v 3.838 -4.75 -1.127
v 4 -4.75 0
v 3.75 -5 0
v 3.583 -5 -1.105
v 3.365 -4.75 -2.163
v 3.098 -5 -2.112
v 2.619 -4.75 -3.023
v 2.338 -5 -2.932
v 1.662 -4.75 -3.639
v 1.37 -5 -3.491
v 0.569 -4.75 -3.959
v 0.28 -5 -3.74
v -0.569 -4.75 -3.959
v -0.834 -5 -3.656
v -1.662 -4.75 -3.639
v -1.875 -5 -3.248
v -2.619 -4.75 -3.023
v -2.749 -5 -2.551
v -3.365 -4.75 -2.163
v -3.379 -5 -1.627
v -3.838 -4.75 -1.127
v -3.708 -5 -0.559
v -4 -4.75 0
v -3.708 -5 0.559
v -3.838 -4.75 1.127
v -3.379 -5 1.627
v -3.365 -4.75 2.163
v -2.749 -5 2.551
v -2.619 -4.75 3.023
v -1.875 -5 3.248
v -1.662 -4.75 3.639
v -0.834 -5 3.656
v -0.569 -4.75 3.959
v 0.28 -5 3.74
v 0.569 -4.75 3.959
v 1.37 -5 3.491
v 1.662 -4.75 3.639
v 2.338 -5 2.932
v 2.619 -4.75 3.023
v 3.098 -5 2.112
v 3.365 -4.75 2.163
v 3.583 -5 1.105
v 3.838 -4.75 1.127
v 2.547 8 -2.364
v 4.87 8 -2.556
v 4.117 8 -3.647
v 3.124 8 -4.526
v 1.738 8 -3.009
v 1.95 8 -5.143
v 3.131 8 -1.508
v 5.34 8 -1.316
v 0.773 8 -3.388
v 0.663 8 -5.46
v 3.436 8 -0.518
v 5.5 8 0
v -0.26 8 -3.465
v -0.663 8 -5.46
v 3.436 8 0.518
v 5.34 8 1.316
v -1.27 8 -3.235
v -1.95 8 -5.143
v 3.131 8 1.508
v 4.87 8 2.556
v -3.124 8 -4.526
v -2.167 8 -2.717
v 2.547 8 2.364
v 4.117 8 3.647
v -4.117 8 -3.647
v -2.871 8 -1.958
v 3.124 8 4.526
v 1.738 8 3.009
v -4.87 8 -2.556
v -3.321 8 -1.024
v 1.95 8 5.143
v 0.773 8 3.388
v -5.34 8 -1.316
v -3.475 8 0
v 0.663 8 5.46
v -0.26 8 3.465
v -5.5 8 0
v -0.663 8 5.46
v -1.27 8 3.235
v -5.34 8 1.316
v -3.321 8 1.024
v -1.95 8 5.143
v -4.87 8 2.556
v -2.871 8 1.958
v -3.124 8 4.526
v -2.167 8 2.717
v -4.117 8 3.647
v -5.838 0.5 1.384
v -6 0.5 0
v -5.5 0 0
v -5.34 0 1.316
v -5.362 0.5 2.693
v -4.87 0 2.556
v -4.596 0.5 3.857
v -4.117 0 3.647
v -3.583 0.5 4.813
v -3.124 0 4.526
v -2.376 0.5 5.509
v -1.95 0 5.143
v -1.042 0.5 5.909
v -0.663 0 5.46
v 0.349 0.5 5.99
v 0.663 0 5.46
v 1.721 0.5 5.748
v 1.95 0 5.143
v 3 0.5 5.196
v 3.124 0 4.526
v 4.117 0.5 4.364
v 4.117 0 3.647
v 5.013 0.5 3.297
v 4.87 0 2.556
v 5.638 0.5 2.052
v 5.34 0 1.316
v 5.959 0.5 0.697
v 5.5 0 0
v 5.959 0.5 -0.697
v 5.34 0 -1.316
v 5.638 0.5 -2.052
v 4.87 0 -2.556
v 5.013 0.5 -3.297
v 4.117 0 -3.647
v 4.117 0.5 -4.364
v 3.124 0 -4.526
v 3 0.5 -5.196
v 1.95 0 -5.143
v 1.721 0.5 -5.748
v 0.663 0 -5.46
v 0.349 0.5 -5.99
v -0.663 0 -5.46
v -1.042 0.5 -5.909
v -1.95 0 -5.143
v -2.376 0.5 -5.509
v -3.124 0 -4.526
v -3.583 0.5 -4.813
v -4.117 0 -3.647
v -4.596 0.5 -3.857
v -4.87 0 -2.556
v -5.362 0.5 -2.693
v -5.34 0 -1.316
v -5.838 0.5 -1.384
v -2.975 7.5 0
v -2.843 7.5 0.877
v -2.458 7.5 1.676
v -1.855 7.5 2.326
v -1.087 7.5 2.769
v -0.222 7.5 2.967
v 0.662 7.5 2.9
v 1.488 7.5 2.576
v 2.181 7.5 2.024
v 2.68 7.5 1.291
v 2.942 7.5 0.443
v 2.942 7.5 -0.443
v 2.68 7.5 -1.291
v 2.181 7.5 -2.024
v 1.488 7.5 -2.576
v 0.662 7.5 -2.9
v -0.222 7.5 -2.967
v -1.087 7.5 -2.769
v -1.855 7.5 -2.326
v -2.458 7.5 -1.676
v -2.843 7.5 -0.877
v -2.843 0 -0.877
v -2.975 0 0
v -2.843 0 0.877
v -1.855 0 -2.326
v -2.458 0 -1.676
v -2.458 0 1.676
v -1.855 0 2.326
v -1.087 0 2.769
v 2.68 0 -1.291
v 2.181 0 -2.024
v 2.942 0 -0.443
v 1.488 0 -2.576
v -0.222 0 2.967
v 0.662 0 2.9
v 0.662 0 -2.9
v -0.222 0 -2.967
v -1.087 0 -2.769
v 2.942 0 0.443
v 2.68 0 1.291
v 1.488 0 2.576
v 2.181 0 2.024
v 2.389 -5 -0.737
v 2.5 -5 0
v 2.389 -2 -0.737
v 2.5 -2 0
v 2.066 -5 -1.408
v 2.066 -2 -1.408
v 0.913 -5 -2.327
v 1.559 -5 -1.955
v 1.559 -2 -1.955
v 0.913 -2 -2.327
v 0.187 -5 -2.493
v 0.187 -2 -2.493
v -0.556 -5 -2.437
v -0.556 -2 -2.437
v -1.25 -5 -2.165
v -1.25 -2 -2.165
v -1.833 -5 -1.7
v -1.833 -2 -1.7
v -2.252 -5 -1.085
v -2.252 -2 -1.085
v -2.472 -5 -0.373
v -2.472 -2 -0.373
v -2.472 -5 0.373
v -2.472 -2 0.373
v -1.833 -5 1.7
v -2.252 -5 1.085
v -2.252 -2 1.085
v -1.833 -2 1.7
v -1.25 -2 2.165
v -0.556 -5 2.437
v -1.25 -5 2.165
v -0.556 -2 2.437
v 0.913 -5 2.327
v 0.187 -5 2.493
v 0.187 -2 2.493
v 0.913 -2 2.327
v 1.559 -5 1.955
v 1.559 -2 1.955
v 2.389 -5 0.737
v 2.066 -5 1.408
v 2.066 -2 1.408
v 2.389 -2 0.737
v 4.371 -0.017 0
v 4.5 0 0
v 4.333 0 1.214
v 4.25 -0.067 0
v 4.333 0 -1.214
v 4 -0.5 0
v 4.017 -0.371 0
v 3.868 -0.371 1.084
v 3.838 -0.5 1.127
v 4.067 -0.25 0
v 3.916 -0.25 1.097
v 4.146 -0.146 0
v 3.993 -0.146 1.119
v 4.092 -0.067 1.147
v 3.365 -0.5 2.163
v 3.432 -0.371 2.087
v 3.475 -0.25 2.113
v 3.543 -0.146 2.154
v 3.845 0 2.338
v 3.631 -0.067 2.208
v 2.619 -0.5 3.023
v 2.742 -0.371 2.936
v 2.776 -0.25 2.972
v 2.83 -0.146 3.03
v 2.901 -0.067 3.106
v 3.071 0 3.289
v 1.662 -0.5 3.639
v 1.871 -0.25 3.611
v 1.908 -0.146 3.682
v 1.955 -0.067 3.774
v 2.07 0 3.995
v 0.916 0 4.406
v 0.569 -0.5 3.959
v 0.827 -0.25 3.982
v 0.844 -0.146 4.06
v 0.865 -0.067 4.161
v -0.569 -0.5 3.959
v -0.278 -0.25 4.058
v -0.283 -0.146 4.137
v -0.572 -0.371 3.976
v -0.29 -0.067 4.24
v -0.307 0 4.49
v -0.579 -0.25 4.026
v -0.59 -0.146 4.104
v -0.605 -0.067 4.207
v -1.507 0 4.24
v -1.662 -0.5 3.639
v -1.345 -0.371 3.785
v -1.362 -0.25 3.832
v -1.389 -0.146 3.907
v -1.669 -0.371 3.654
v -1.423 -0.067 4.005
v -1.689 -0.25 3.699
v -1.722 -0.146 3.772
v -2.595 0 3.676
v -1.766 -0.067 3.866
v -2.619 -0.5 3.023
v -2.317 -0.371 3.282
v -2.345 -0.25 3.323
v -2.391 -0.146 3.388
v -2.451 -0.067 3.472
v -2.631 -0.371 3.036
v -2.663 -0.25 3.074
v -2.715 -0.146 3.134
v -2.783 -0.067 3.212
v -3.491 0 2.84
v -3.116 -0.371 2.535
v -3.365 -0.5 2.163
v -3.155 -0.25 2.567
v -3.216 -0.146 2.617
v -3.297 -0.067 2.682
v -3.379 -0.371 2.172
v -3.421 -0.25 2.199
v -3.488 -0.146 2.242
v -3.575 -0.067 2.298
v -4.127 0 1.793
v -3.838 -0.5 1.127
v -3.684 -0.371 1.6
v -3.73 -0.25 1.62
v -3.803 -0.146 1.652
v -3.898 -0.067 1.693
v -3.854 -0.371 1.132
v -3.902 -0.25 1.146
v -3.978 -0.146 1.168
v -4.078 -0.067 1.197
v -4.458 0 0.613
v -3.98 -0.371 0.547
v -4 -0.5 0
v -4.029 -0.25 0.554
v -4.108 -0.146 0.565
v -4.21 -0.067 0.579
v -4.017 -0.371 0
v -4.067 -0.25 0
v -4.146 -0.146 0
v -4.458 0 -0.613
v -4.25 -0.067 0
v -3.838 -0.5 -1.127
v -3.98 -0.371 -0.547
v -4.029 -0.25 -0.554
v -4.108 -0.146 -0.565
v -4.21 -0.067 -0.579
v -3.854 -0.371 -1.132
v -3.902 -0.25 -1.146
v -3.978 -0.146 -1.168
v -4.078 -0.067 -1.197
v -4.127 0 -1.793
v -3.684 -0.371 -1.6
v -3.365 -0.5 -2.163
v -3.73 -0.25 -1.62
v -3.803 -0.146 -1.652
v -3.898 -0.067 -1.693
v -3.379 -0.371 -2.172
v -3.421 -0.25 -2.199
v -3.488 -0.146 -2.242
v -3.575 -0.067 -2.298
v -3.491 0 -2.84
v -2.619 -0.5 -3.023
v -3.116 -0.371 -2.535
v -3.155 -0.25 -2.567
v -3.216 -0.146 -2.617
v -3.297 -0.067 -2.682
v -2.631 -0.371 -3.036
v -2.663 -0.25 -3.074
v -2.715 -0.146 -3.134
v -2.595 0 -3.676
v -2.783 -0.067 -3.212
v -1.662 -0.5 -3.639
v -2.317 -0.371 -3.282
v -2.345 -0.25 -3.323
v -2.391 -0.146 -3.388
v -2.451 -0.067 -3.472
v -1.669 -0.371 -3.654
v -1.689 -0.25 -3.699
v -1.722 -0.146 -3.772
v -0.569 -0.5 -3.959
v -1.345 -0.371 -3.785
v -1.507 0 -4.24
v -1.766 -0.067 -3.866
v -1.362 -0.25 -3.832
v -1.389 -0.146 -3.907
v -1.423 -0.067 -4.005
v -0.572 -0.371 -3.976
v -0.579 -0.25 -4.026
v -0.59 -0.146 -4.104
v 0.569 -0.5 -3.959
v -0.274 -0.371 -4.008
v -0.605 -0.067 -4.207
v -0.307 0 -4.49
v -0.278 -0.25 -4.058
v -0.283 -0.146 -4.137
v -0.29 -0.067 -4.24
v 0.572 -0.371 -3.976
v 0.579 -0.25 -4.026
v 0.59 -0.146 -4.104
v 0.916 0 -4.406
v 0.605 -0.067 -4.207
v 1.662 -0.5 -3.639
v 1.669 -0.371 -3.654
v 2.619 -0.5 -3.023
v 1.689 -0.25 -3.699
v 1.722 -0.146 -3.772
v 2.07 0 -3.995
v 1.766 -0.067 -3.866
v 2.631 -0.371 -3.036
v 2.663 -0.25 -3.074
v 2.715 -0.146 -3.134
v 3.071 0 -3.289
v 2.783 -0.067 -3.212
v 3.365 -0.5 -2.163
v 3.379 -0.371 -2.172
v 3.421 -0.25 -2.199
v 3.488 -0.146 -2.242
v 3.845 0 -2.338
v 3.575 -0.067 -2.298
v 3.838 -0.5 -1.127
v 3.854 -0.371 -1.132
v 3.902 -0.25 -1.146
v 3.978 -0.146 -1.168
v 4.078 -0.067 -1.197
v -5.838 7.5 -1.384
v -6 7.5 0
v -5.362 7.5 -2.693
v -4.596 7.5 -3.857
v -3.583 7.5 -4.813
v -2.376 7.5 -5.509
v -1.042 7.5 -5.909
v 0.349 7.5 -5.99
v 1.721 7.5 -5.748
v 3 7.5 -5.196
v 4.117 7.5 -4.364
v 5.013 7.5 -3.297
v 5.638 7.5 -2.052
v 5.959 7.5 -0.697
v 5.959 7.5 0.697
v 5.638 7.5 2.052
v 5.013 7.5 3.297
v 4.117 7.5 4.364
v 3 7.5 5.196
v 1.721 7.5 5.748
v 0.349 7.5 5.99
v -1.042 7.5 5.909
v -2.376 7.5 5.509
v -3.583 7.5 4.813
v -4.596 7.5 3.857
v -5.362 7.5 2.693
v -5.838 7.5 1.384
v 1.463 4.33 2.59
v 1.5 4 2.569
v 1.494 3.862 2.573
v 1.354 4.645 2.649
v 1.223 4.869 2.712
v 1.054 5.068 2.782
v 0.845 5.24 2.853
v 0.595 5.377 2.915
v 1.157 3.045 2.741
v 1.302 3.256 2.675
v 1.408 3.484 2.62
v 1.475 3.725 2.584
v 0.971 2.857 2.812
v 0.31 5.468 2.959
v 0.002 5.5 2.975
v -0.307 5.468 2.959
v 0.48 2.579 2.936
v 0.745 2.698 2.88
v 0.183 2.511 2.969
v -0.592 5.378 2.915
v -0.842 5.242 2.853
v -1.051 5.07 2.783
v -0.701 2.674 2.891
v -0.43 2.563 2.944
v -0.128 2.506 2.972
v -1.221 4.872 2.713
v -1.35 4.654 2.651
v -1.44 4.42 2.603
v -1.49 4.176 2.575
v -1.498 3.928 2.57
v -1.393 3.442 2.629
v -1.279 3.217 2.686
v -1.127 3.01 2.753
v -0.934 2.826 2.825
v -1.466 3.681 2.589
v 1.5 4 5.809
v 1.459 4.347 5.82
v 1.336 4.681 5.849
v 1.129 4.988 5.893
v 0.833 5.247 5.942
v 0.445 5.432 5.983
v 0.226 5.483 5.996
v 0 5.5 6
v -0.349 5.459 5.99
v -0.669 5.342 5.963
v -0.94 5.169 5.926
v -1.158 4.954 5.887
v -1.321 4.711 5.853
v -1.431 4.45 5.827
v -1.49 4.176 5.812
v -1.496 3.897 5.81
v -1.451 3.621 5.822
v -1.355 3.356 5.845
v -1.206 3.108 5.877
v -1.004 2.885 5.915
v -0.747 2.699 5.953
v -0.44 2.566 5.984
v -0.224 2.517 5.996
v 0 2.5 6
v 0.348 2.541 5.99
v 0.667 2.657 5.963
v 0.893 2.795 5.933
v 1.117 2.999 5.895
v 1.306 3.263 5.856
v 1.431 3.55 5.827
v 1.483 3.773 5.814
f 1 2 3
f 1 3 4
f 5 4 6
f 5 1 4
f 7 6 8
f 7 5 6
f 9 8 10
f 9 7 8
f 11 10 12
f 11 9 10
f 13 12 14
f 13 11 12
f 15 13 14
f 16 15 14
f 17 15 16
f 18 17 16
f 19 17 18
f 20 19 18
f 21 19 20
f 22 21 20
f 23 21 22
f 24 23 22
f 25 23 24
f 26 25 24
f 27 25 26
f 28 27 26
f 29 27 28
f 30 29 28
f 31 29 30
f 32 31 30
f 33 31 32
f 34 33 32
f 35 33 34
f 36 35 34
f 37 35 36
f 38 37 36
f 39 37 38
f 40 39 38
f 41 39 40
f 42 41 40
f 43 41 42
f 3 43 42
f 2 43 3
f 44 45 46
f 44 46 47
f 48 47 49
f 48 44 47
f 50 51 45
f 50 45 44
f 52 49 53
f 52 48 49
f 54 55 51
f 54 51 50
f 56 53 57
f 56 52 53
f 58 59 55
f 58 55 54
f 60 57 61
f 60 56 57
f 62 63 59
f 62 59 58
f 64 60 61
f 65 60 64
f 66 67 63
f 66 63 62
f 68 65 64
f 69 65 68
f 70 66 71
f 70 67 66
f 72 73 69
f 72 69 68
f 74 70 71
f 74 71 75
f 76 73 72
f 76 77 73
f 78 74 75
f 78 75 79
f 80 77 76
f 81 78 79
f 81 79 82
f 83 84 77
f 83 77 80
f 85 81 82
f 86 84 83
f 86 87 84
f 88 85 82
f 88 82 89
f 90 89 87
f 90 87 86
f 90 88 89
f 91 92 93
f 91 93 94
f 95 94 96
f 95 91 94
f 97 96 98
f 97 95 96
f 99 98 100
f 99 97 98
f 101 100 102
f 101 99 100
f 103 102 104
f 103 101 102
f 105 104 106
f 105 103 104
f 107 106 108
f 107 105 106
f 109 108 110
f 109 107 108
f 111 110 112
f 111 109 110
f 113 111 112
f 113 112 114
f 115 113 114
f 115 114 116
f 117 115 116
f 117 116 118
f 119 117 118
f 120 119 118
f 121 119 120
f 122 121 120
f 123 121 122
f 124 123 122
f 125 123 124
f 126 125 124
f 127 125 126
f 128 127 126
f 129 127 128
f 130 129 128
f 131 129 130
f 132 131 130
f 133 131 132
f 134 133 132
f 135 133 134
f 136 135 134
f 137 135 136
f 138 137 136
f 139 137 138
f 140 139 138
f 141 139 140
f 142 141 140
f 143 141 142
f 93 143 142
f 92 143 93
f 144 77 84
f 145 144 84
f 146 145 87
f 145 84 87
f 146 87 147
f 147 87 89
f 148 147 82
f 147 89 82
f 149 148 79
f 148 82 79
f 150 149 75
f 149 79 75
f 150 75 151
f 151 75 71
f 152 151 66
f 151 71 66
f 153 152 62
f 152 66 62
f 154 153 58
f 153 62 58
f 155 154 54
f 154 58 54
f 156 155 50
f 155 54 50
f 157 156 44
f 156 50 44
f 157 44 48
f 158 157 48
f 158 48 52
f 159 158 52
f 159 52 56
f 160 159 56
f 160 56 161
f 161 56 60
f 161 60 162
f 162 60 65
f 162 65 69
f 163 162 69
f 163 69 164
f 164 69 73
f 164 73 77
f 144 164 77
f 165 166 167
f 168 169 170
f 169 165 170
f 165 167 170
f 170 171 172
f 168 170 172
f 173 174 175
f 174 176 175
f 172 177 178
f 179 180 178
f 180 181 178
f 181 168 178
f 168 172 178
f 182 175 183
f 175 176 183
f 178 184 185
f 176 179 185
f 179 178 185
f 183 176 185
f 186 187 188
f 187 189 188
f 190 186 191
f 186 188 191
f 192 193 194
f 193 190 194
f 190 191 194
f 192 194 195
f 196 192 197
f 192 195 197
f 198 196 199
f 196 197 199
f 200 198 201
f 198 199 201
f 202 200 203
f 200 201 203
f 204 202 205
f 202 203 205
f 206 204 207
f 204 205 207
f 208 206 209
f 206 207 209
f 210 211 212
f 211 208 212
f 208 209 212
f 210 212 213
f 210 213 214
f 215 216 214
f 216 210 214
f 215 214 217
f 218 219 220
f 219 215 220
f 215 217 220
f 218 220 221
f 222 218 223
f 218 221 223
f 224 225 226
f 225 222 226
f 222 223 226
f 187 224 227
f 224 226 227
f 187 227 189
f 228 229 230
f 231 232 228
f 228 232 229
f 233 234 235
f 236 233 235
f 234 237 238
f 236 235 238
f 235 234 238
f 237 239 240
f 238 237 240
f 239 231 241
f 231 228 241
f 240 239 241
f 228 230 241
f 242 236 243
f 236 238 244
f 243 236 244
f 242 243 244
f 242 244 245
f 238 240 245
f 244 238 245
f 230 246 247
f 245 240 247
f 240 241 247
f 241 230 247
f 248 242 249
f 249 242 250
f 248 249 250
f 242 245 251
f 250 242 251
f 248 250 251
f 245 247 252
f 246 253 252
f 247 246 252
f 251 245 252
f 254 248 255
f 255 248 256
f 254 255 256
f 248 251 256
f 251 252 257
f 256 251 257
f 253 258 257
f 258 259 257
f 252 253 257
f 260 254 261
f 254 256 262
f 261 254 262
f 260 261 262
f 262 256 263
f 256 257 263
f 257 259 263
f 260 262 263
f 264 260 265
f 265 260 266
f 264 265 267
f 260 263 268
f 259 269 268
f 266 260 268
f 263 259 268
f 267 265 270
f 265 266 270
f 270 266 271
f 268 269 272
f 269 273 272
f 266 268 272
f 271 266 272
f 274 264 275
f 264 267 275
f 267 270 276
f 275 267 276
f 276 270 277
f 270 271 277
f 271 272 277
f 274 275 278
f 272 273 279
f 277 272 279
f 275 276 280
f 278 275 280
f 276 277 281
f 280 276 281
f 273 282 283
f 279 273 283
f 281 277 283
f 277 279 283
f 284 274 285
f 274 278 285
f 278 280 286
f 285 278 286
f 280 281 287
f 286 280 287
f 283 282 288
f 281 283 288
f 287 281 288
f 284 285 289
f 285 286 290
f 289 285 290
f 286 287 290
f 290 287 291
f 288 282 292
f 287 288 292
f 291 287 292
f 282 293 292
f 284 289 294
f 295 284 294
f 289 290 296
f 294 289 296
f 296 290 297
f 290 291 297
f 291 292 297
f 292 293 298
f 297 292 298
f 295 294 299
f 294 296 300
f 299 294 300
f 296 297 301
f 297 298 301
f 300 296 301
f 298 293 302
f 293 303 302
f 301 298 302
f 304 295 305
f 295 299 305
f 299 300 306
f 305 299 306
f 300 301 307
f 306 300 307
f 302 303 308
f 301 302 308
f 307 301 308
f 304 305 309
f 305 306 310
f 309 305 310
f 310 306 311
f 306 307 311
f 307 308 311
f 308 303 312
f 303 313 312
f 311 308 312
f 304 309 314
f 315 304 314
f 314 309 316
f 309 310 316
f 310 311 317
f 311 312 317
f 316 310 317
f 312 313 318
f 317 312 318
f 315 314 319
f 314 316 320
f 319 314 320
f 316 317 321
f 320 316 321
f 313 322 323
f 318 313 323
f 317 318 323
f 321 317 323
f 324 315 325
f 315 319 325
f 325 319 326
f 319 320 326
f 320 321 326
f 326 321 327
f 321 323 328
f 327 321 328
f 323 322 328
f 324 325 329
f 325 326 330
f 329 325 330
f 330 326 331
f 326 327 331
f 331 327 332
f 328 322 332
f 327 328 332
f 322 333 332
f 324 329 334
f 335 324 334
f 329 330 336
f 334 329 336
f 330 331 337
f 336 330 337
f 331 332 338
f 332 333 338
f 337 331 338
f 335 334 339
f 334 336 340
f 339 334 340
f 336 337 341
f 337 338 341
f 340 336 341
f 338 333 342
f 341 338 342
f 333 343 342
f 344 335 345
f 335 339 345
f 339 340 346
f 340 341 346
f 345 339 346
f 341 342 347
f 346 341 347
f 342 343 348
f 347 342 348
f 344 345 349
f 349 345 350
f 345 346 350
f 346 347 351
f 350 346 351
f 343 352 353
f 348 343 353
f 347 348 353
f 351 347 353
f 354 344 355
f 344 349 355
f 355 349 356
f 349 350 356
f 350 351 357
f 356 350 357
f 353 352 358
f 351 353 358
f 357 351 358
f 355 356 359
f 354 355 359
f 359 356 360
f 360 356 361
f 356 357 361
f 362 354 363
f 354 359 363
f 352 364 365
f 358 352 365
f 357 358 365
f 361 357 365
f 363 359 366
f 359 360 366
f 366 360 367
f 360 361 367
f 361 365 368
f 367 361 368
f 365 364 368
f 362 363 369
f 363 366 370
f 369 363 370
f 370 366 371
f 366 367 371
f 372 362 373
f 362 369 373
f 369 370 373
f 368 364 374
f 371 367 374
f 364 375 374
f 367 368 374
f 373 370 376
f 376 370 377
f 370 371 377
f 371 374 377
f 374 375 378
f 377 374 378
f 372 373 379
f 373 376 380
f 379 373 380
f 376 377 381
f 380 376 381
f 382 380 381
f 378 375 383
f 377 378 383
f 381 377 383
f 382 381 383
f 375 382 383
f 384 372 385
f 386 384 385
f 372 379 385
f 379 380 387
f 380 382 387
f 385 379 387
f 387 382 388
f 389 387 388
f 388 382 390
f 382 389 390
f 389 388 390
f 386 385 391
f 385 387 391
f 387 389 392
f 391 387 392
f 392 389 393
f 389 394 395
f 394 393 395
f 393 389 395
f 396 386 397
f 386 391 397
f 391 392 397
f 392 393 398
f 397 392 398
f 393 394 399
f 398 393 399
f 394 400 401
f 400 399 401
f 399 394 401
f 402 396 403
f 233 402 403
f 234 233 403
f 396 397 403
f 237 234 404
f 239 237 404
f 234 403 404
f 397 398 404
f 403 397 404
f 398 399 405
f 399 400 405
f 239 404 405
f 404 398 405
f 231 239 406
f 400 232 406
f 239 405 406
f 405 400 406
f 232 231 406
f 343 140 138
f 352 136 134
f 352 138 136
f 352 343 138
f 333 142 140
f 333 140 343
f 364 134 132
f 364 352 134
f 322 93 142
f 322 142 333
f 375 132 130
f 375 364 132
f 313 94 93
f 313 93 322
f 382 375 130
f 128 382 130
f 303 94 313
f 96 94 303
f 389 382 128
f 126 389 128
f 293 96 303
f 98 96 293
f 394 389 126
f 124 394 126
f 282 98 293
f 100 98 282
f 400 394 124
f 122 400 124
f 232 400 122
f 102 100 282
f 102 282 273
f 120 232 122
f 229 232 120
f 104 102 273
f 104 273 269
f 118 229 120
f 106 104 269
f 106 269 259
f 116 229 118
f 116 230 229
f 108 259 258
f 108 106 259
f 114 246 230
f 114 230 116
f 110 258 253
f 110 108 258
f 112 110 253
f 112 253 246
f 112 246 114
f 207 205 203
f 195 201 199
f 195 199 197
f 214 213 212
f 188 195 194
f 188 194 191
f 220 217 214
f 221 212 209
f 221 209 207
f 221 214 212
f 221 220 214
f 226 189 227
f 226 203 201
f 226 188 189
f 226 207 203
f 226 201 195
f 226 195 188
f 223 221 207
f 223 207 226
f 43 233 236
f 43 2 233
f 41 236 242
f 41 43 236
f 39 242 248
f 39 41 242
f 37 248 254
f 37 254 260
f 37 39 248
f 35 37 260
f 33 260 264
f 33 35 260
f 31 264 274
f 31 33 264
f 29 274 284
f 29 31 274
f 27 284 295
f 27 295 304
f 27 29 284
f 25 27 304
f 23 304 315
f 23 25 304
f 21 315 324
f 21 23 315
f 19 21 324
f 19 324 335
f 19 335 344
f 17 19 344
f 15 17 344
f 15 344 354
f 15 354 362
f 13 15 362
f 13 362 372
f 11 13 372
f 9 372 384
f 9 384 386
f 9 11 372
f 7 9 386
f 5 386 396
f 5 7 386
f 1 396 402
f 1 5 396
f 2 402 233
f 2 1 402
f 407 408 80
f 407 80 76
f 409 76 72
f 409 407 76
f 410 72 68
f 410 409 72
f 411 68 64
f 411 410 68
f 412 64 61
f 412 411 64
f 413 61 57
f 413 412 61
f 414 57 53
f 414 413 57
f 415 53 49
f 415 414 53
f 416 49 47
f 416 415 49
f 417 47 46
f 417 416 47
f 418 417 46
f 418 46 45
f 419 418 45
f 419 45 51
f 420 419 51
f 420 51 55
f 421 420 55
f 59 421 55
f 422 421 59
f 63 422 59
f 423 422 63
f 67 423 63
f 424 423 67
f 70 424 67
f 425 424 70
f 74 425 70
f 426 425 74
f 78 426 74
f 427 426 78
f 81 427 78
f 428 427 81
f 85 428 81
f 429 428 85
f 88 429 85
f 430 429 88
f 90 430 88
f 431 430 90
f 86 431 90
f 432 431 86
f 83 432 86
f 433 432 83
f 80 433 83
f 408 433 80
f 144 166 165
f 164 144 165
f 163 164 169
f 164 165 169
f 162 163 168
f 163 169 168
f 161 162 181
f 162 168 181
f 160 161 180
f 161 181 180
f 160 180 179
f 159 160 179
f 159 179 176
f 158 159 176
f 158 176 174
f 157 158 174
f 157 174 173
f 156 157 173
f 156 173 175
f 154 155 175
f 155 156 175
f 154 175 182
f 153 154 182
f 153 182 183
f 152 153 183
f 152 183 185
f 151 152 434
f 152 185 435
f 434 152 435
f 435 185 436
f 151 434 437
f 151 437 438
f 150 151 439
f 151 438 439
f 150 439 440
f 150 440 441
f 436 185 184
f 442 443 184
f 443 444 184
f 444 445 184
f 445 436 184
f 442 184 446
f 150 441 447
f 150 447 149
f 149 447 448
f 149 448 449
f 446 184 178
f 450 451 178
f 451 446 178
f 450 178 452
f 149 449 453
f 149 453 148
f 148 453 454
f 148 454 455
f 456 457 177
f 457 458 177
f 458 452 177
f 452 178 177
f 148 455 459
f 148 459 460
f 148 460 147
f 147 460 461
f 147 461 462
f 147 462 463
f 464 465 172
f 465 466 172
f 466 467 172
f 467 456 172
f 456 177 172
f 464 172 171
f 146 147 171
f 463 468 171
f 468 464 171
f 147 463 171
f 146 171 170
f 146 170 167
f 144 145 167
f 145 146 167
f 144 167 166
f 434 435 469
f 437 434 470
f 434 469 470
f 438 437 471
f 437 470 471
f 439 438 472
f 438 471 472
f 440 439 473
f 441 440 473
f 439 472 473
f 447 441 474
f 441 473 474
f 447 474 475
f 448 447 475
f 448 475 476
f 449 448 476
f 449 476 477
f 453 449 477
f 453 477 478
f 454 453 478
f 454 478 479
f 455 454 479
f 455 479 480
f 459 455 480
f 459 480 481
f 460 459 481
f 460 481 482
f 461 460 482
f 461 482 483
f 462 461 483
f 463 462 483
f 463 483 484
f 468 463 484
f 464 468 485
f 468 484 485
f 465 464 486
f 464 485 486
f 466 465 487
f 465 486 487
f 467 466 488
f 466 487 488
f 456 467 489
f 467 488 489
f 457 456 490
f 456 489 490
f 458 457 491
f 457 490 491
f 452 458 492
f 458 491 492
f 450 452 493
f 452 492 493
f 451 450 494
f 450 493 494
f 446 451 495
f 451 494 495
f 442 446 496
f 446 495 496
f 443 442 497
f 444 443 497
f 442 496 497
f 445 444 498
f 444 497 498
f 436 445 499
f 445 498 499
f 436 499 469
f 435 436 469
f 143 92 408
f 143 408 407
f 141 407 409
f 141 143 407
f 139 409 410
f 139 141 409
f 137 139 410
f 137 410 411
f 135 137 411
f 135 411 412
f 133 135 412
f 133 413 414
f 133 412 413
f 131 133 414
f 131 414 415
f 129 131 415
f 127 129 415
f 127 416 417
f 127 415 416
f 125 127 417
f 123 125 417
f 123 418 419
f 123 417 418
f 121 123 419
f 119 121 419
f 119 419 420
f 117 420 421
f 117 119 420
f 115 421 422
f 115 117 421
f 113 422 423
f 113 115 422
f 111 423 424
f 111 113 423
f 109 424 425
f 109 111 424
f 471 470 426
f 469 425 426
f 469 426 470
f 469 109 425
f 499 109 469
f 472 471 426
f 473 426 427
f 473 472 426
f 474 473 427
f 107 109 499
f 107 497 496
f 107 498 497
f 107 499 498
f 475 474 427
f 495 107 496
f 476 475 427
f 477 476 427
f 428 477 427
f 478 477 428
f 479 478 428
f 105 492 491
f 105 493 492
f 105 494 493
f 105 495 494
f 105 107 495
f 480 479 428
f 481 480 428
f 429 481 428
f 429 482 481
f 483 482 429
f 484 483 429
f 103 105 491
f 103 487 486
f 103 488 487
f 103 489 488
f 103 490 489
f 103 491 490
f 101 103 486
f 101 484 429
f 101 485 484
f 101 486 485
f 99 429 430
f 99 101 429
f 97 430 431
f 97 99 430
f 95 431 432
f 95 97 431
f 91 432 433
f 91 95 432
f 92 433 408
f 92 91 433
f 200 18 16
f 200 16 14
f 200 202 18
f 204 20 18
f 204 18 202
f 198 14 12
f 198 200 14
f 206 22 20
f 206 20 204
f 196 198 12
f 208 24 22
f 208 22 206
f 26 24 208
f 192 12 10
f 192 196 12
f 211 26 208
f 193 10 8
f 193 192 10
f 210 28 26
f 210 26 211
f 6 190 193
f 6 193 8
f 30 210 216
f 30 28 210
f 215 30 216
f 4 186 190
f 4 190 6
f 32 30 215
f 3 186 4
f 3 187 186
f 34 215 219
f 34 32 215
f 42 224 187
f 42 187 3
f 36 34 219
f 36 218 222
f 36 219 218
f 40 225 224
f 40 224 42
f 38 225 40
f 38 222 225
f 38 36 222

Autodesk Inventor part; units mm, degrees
ref_plane "Plano de trabajo1" through (15, 0, 0) normal (1, 0, 0) x (0, 1, 0)
ref_plane "Plano de trabajo2" through (0, 0, 7.5) normal (0, 0, 1) x (1, 0, 0)
sketch "Boceto9" plane through (0, 0, 0) normal (0, 1, 0) x (-1, 0, 0)
  circle A0 centre (0, 0) radius 6
  circle A1 centre (0, 0) radius 2.975
  dimension "d34" = 12
  dimension "d35" = 5.95
extrude "Extrusión9" add sketch "Boceto9" along normal blind 8
sketch "Boceto10" plane through (0, 0, 0) normal (0, -1, 0) x (1, 0, 0)
  circle A0 centre (0, 0) radius 6 projected
  circle A1 centre (0, 0) radius 2.975 projected
  circle A2 centre (0, 0) radius 5
  dimension "d38" = 1
extrude "Extrusión10" add sketch "Boceto10" along normal blind 5 contours A2
sketch "Boceto11" plane through (0, 0, 0) normal (0, -1, 0) x (1, 0, 0)
  circle A0 centre (0, 0) radius 2.975 projected
extrude "Extrusión11" add sketch "Boceto11" along normal blind 2
sketch "Boceto12" plane through (0, -2, 0) normal (0, -1, 0) x (1, 0, 0)
  circle A0 centre (0, 0) radius 2.5
  circle A1 centre (0, 0) radius 2.975 projected
  dimension "d43" = 5
extrude "Extrusión12" add sketch "Boceto12" along normal blind 3
sketch "Boceto13" plane through (0, -5, 0) normal (0, -1, 0) x (1, 0, 0)
  circle A0 centre (0, 0) radius 4
  circle A1 centre (0, 0) radius 5 projected
  dimension "d46" = 8
extrude "Extrusión13" cut sketch "Boceto13" against normal blind 5
chamfer "Chaflán4" distance 0.25 angle 45 1 edges at (-4, -5, 0)
fillet "Empalme2" radius 0.5 1 edges at (-4, 0, 0)
chamfer "Chaflán5" distance 0.5 angle 45 2 edges at (6, 0, 0) (6, 8, 0)
chamfer "Chaflán6" distance 0.5 angle 45 1 edges at (2.975, 8, 0)
ref_plane "Plano de trabajo3" through (0, 0, 6) normal (0, 0, 1) x (1, 0, 0)
sketch "Boceto14" plane through (0, 0, 6) normal (0, 0, 1) x (1, 0, 0)
  line L0 (-6, 0.5) -> (6, 0.5) projected
  line L1 (6, 7.5) -> (-6, 7.5) projected
  line L2 (0, 0.5) -> (0, 7.5) construction
  circle A0 centre (0, 4) radius 1.5
  point P0 (0, 0)
  dimension "d60" = 3
extrude "Extrusión14" cut sketch "Boceto14" against normal blind 4
sketch "Boceto1" plane through (0, 0, 0) normal (0, 1, 0) x (-1, 0, 0)
  circle A0 centre (0, 0) radius 15
  dimension "d0" = 30
sketch "Boceto2" plane through (0, 10, 0) normal (0, 1, 0) x (1, 0, 0)
  circle A0 centre (0, 0) radius 2.5
  dimension "d3" = 5
sketch "Boceto3" plane through (0, 0, 0) normal (0, -1, 0) x (1, 0, 0)
  circle A0 centre (0, 0) radius 7.5
  dimension "d6" = 15
sketch "Boceto4" plane through (0, -10, 0) normal (0, -1, 0) x (1, 0, 0)
  circle A0 centre (0, 0) radius 2.975
  dimension "d9" = 5.95
sketch "Boceto6" plane through (0, -10, 0) normal (0, -1, 0) x (1, 0, 0)
  circle A0 centre (0, 0) radius 2.975 projected
  circle A1 centre (0, 0) radius 7.5 projected
sketch "Boceto8" plane through (0, 0, 7.5) normal (0, 0, 1) x (1, 0, 0)
  line L0 (-7.5, -14) -> (7.5, -14) projected
  line L1 (7.5, -2) -> (-7.5, -2) projected
  line L2 (7.5, -2) -> (7.5, -14) projected
  line L3 (-7.5, -2) -> (-7.5, -14) projected
  line L4 (7.5, -8) -> (-7.5, -8) construction
  circle A0 centre (0, -8) radius 1.5
  point P0 (0, 0)
  dimension "d31" = 3
sketch "Boceto7" plane through (15, 0, 0) normal (1, 0, 0) x (0, 1, 0)
  line L0 (1, 15) -> (1, -15) projected
  line L1 (14, -15) -> (14, 15) projected
  line L2 (1, -15) -> (10, -15) projected
  line L3 (1, 15) -> (10, 15) projected
  line L4 (7.5, 15) -> (7.5, -15) construction
  circle A0 centre (7.5, 0) radius 1.5
  point P0 (0, 0)
  dimension "d27" = 3
properties part number "Acople_EJE" material "Acero, aleación"
